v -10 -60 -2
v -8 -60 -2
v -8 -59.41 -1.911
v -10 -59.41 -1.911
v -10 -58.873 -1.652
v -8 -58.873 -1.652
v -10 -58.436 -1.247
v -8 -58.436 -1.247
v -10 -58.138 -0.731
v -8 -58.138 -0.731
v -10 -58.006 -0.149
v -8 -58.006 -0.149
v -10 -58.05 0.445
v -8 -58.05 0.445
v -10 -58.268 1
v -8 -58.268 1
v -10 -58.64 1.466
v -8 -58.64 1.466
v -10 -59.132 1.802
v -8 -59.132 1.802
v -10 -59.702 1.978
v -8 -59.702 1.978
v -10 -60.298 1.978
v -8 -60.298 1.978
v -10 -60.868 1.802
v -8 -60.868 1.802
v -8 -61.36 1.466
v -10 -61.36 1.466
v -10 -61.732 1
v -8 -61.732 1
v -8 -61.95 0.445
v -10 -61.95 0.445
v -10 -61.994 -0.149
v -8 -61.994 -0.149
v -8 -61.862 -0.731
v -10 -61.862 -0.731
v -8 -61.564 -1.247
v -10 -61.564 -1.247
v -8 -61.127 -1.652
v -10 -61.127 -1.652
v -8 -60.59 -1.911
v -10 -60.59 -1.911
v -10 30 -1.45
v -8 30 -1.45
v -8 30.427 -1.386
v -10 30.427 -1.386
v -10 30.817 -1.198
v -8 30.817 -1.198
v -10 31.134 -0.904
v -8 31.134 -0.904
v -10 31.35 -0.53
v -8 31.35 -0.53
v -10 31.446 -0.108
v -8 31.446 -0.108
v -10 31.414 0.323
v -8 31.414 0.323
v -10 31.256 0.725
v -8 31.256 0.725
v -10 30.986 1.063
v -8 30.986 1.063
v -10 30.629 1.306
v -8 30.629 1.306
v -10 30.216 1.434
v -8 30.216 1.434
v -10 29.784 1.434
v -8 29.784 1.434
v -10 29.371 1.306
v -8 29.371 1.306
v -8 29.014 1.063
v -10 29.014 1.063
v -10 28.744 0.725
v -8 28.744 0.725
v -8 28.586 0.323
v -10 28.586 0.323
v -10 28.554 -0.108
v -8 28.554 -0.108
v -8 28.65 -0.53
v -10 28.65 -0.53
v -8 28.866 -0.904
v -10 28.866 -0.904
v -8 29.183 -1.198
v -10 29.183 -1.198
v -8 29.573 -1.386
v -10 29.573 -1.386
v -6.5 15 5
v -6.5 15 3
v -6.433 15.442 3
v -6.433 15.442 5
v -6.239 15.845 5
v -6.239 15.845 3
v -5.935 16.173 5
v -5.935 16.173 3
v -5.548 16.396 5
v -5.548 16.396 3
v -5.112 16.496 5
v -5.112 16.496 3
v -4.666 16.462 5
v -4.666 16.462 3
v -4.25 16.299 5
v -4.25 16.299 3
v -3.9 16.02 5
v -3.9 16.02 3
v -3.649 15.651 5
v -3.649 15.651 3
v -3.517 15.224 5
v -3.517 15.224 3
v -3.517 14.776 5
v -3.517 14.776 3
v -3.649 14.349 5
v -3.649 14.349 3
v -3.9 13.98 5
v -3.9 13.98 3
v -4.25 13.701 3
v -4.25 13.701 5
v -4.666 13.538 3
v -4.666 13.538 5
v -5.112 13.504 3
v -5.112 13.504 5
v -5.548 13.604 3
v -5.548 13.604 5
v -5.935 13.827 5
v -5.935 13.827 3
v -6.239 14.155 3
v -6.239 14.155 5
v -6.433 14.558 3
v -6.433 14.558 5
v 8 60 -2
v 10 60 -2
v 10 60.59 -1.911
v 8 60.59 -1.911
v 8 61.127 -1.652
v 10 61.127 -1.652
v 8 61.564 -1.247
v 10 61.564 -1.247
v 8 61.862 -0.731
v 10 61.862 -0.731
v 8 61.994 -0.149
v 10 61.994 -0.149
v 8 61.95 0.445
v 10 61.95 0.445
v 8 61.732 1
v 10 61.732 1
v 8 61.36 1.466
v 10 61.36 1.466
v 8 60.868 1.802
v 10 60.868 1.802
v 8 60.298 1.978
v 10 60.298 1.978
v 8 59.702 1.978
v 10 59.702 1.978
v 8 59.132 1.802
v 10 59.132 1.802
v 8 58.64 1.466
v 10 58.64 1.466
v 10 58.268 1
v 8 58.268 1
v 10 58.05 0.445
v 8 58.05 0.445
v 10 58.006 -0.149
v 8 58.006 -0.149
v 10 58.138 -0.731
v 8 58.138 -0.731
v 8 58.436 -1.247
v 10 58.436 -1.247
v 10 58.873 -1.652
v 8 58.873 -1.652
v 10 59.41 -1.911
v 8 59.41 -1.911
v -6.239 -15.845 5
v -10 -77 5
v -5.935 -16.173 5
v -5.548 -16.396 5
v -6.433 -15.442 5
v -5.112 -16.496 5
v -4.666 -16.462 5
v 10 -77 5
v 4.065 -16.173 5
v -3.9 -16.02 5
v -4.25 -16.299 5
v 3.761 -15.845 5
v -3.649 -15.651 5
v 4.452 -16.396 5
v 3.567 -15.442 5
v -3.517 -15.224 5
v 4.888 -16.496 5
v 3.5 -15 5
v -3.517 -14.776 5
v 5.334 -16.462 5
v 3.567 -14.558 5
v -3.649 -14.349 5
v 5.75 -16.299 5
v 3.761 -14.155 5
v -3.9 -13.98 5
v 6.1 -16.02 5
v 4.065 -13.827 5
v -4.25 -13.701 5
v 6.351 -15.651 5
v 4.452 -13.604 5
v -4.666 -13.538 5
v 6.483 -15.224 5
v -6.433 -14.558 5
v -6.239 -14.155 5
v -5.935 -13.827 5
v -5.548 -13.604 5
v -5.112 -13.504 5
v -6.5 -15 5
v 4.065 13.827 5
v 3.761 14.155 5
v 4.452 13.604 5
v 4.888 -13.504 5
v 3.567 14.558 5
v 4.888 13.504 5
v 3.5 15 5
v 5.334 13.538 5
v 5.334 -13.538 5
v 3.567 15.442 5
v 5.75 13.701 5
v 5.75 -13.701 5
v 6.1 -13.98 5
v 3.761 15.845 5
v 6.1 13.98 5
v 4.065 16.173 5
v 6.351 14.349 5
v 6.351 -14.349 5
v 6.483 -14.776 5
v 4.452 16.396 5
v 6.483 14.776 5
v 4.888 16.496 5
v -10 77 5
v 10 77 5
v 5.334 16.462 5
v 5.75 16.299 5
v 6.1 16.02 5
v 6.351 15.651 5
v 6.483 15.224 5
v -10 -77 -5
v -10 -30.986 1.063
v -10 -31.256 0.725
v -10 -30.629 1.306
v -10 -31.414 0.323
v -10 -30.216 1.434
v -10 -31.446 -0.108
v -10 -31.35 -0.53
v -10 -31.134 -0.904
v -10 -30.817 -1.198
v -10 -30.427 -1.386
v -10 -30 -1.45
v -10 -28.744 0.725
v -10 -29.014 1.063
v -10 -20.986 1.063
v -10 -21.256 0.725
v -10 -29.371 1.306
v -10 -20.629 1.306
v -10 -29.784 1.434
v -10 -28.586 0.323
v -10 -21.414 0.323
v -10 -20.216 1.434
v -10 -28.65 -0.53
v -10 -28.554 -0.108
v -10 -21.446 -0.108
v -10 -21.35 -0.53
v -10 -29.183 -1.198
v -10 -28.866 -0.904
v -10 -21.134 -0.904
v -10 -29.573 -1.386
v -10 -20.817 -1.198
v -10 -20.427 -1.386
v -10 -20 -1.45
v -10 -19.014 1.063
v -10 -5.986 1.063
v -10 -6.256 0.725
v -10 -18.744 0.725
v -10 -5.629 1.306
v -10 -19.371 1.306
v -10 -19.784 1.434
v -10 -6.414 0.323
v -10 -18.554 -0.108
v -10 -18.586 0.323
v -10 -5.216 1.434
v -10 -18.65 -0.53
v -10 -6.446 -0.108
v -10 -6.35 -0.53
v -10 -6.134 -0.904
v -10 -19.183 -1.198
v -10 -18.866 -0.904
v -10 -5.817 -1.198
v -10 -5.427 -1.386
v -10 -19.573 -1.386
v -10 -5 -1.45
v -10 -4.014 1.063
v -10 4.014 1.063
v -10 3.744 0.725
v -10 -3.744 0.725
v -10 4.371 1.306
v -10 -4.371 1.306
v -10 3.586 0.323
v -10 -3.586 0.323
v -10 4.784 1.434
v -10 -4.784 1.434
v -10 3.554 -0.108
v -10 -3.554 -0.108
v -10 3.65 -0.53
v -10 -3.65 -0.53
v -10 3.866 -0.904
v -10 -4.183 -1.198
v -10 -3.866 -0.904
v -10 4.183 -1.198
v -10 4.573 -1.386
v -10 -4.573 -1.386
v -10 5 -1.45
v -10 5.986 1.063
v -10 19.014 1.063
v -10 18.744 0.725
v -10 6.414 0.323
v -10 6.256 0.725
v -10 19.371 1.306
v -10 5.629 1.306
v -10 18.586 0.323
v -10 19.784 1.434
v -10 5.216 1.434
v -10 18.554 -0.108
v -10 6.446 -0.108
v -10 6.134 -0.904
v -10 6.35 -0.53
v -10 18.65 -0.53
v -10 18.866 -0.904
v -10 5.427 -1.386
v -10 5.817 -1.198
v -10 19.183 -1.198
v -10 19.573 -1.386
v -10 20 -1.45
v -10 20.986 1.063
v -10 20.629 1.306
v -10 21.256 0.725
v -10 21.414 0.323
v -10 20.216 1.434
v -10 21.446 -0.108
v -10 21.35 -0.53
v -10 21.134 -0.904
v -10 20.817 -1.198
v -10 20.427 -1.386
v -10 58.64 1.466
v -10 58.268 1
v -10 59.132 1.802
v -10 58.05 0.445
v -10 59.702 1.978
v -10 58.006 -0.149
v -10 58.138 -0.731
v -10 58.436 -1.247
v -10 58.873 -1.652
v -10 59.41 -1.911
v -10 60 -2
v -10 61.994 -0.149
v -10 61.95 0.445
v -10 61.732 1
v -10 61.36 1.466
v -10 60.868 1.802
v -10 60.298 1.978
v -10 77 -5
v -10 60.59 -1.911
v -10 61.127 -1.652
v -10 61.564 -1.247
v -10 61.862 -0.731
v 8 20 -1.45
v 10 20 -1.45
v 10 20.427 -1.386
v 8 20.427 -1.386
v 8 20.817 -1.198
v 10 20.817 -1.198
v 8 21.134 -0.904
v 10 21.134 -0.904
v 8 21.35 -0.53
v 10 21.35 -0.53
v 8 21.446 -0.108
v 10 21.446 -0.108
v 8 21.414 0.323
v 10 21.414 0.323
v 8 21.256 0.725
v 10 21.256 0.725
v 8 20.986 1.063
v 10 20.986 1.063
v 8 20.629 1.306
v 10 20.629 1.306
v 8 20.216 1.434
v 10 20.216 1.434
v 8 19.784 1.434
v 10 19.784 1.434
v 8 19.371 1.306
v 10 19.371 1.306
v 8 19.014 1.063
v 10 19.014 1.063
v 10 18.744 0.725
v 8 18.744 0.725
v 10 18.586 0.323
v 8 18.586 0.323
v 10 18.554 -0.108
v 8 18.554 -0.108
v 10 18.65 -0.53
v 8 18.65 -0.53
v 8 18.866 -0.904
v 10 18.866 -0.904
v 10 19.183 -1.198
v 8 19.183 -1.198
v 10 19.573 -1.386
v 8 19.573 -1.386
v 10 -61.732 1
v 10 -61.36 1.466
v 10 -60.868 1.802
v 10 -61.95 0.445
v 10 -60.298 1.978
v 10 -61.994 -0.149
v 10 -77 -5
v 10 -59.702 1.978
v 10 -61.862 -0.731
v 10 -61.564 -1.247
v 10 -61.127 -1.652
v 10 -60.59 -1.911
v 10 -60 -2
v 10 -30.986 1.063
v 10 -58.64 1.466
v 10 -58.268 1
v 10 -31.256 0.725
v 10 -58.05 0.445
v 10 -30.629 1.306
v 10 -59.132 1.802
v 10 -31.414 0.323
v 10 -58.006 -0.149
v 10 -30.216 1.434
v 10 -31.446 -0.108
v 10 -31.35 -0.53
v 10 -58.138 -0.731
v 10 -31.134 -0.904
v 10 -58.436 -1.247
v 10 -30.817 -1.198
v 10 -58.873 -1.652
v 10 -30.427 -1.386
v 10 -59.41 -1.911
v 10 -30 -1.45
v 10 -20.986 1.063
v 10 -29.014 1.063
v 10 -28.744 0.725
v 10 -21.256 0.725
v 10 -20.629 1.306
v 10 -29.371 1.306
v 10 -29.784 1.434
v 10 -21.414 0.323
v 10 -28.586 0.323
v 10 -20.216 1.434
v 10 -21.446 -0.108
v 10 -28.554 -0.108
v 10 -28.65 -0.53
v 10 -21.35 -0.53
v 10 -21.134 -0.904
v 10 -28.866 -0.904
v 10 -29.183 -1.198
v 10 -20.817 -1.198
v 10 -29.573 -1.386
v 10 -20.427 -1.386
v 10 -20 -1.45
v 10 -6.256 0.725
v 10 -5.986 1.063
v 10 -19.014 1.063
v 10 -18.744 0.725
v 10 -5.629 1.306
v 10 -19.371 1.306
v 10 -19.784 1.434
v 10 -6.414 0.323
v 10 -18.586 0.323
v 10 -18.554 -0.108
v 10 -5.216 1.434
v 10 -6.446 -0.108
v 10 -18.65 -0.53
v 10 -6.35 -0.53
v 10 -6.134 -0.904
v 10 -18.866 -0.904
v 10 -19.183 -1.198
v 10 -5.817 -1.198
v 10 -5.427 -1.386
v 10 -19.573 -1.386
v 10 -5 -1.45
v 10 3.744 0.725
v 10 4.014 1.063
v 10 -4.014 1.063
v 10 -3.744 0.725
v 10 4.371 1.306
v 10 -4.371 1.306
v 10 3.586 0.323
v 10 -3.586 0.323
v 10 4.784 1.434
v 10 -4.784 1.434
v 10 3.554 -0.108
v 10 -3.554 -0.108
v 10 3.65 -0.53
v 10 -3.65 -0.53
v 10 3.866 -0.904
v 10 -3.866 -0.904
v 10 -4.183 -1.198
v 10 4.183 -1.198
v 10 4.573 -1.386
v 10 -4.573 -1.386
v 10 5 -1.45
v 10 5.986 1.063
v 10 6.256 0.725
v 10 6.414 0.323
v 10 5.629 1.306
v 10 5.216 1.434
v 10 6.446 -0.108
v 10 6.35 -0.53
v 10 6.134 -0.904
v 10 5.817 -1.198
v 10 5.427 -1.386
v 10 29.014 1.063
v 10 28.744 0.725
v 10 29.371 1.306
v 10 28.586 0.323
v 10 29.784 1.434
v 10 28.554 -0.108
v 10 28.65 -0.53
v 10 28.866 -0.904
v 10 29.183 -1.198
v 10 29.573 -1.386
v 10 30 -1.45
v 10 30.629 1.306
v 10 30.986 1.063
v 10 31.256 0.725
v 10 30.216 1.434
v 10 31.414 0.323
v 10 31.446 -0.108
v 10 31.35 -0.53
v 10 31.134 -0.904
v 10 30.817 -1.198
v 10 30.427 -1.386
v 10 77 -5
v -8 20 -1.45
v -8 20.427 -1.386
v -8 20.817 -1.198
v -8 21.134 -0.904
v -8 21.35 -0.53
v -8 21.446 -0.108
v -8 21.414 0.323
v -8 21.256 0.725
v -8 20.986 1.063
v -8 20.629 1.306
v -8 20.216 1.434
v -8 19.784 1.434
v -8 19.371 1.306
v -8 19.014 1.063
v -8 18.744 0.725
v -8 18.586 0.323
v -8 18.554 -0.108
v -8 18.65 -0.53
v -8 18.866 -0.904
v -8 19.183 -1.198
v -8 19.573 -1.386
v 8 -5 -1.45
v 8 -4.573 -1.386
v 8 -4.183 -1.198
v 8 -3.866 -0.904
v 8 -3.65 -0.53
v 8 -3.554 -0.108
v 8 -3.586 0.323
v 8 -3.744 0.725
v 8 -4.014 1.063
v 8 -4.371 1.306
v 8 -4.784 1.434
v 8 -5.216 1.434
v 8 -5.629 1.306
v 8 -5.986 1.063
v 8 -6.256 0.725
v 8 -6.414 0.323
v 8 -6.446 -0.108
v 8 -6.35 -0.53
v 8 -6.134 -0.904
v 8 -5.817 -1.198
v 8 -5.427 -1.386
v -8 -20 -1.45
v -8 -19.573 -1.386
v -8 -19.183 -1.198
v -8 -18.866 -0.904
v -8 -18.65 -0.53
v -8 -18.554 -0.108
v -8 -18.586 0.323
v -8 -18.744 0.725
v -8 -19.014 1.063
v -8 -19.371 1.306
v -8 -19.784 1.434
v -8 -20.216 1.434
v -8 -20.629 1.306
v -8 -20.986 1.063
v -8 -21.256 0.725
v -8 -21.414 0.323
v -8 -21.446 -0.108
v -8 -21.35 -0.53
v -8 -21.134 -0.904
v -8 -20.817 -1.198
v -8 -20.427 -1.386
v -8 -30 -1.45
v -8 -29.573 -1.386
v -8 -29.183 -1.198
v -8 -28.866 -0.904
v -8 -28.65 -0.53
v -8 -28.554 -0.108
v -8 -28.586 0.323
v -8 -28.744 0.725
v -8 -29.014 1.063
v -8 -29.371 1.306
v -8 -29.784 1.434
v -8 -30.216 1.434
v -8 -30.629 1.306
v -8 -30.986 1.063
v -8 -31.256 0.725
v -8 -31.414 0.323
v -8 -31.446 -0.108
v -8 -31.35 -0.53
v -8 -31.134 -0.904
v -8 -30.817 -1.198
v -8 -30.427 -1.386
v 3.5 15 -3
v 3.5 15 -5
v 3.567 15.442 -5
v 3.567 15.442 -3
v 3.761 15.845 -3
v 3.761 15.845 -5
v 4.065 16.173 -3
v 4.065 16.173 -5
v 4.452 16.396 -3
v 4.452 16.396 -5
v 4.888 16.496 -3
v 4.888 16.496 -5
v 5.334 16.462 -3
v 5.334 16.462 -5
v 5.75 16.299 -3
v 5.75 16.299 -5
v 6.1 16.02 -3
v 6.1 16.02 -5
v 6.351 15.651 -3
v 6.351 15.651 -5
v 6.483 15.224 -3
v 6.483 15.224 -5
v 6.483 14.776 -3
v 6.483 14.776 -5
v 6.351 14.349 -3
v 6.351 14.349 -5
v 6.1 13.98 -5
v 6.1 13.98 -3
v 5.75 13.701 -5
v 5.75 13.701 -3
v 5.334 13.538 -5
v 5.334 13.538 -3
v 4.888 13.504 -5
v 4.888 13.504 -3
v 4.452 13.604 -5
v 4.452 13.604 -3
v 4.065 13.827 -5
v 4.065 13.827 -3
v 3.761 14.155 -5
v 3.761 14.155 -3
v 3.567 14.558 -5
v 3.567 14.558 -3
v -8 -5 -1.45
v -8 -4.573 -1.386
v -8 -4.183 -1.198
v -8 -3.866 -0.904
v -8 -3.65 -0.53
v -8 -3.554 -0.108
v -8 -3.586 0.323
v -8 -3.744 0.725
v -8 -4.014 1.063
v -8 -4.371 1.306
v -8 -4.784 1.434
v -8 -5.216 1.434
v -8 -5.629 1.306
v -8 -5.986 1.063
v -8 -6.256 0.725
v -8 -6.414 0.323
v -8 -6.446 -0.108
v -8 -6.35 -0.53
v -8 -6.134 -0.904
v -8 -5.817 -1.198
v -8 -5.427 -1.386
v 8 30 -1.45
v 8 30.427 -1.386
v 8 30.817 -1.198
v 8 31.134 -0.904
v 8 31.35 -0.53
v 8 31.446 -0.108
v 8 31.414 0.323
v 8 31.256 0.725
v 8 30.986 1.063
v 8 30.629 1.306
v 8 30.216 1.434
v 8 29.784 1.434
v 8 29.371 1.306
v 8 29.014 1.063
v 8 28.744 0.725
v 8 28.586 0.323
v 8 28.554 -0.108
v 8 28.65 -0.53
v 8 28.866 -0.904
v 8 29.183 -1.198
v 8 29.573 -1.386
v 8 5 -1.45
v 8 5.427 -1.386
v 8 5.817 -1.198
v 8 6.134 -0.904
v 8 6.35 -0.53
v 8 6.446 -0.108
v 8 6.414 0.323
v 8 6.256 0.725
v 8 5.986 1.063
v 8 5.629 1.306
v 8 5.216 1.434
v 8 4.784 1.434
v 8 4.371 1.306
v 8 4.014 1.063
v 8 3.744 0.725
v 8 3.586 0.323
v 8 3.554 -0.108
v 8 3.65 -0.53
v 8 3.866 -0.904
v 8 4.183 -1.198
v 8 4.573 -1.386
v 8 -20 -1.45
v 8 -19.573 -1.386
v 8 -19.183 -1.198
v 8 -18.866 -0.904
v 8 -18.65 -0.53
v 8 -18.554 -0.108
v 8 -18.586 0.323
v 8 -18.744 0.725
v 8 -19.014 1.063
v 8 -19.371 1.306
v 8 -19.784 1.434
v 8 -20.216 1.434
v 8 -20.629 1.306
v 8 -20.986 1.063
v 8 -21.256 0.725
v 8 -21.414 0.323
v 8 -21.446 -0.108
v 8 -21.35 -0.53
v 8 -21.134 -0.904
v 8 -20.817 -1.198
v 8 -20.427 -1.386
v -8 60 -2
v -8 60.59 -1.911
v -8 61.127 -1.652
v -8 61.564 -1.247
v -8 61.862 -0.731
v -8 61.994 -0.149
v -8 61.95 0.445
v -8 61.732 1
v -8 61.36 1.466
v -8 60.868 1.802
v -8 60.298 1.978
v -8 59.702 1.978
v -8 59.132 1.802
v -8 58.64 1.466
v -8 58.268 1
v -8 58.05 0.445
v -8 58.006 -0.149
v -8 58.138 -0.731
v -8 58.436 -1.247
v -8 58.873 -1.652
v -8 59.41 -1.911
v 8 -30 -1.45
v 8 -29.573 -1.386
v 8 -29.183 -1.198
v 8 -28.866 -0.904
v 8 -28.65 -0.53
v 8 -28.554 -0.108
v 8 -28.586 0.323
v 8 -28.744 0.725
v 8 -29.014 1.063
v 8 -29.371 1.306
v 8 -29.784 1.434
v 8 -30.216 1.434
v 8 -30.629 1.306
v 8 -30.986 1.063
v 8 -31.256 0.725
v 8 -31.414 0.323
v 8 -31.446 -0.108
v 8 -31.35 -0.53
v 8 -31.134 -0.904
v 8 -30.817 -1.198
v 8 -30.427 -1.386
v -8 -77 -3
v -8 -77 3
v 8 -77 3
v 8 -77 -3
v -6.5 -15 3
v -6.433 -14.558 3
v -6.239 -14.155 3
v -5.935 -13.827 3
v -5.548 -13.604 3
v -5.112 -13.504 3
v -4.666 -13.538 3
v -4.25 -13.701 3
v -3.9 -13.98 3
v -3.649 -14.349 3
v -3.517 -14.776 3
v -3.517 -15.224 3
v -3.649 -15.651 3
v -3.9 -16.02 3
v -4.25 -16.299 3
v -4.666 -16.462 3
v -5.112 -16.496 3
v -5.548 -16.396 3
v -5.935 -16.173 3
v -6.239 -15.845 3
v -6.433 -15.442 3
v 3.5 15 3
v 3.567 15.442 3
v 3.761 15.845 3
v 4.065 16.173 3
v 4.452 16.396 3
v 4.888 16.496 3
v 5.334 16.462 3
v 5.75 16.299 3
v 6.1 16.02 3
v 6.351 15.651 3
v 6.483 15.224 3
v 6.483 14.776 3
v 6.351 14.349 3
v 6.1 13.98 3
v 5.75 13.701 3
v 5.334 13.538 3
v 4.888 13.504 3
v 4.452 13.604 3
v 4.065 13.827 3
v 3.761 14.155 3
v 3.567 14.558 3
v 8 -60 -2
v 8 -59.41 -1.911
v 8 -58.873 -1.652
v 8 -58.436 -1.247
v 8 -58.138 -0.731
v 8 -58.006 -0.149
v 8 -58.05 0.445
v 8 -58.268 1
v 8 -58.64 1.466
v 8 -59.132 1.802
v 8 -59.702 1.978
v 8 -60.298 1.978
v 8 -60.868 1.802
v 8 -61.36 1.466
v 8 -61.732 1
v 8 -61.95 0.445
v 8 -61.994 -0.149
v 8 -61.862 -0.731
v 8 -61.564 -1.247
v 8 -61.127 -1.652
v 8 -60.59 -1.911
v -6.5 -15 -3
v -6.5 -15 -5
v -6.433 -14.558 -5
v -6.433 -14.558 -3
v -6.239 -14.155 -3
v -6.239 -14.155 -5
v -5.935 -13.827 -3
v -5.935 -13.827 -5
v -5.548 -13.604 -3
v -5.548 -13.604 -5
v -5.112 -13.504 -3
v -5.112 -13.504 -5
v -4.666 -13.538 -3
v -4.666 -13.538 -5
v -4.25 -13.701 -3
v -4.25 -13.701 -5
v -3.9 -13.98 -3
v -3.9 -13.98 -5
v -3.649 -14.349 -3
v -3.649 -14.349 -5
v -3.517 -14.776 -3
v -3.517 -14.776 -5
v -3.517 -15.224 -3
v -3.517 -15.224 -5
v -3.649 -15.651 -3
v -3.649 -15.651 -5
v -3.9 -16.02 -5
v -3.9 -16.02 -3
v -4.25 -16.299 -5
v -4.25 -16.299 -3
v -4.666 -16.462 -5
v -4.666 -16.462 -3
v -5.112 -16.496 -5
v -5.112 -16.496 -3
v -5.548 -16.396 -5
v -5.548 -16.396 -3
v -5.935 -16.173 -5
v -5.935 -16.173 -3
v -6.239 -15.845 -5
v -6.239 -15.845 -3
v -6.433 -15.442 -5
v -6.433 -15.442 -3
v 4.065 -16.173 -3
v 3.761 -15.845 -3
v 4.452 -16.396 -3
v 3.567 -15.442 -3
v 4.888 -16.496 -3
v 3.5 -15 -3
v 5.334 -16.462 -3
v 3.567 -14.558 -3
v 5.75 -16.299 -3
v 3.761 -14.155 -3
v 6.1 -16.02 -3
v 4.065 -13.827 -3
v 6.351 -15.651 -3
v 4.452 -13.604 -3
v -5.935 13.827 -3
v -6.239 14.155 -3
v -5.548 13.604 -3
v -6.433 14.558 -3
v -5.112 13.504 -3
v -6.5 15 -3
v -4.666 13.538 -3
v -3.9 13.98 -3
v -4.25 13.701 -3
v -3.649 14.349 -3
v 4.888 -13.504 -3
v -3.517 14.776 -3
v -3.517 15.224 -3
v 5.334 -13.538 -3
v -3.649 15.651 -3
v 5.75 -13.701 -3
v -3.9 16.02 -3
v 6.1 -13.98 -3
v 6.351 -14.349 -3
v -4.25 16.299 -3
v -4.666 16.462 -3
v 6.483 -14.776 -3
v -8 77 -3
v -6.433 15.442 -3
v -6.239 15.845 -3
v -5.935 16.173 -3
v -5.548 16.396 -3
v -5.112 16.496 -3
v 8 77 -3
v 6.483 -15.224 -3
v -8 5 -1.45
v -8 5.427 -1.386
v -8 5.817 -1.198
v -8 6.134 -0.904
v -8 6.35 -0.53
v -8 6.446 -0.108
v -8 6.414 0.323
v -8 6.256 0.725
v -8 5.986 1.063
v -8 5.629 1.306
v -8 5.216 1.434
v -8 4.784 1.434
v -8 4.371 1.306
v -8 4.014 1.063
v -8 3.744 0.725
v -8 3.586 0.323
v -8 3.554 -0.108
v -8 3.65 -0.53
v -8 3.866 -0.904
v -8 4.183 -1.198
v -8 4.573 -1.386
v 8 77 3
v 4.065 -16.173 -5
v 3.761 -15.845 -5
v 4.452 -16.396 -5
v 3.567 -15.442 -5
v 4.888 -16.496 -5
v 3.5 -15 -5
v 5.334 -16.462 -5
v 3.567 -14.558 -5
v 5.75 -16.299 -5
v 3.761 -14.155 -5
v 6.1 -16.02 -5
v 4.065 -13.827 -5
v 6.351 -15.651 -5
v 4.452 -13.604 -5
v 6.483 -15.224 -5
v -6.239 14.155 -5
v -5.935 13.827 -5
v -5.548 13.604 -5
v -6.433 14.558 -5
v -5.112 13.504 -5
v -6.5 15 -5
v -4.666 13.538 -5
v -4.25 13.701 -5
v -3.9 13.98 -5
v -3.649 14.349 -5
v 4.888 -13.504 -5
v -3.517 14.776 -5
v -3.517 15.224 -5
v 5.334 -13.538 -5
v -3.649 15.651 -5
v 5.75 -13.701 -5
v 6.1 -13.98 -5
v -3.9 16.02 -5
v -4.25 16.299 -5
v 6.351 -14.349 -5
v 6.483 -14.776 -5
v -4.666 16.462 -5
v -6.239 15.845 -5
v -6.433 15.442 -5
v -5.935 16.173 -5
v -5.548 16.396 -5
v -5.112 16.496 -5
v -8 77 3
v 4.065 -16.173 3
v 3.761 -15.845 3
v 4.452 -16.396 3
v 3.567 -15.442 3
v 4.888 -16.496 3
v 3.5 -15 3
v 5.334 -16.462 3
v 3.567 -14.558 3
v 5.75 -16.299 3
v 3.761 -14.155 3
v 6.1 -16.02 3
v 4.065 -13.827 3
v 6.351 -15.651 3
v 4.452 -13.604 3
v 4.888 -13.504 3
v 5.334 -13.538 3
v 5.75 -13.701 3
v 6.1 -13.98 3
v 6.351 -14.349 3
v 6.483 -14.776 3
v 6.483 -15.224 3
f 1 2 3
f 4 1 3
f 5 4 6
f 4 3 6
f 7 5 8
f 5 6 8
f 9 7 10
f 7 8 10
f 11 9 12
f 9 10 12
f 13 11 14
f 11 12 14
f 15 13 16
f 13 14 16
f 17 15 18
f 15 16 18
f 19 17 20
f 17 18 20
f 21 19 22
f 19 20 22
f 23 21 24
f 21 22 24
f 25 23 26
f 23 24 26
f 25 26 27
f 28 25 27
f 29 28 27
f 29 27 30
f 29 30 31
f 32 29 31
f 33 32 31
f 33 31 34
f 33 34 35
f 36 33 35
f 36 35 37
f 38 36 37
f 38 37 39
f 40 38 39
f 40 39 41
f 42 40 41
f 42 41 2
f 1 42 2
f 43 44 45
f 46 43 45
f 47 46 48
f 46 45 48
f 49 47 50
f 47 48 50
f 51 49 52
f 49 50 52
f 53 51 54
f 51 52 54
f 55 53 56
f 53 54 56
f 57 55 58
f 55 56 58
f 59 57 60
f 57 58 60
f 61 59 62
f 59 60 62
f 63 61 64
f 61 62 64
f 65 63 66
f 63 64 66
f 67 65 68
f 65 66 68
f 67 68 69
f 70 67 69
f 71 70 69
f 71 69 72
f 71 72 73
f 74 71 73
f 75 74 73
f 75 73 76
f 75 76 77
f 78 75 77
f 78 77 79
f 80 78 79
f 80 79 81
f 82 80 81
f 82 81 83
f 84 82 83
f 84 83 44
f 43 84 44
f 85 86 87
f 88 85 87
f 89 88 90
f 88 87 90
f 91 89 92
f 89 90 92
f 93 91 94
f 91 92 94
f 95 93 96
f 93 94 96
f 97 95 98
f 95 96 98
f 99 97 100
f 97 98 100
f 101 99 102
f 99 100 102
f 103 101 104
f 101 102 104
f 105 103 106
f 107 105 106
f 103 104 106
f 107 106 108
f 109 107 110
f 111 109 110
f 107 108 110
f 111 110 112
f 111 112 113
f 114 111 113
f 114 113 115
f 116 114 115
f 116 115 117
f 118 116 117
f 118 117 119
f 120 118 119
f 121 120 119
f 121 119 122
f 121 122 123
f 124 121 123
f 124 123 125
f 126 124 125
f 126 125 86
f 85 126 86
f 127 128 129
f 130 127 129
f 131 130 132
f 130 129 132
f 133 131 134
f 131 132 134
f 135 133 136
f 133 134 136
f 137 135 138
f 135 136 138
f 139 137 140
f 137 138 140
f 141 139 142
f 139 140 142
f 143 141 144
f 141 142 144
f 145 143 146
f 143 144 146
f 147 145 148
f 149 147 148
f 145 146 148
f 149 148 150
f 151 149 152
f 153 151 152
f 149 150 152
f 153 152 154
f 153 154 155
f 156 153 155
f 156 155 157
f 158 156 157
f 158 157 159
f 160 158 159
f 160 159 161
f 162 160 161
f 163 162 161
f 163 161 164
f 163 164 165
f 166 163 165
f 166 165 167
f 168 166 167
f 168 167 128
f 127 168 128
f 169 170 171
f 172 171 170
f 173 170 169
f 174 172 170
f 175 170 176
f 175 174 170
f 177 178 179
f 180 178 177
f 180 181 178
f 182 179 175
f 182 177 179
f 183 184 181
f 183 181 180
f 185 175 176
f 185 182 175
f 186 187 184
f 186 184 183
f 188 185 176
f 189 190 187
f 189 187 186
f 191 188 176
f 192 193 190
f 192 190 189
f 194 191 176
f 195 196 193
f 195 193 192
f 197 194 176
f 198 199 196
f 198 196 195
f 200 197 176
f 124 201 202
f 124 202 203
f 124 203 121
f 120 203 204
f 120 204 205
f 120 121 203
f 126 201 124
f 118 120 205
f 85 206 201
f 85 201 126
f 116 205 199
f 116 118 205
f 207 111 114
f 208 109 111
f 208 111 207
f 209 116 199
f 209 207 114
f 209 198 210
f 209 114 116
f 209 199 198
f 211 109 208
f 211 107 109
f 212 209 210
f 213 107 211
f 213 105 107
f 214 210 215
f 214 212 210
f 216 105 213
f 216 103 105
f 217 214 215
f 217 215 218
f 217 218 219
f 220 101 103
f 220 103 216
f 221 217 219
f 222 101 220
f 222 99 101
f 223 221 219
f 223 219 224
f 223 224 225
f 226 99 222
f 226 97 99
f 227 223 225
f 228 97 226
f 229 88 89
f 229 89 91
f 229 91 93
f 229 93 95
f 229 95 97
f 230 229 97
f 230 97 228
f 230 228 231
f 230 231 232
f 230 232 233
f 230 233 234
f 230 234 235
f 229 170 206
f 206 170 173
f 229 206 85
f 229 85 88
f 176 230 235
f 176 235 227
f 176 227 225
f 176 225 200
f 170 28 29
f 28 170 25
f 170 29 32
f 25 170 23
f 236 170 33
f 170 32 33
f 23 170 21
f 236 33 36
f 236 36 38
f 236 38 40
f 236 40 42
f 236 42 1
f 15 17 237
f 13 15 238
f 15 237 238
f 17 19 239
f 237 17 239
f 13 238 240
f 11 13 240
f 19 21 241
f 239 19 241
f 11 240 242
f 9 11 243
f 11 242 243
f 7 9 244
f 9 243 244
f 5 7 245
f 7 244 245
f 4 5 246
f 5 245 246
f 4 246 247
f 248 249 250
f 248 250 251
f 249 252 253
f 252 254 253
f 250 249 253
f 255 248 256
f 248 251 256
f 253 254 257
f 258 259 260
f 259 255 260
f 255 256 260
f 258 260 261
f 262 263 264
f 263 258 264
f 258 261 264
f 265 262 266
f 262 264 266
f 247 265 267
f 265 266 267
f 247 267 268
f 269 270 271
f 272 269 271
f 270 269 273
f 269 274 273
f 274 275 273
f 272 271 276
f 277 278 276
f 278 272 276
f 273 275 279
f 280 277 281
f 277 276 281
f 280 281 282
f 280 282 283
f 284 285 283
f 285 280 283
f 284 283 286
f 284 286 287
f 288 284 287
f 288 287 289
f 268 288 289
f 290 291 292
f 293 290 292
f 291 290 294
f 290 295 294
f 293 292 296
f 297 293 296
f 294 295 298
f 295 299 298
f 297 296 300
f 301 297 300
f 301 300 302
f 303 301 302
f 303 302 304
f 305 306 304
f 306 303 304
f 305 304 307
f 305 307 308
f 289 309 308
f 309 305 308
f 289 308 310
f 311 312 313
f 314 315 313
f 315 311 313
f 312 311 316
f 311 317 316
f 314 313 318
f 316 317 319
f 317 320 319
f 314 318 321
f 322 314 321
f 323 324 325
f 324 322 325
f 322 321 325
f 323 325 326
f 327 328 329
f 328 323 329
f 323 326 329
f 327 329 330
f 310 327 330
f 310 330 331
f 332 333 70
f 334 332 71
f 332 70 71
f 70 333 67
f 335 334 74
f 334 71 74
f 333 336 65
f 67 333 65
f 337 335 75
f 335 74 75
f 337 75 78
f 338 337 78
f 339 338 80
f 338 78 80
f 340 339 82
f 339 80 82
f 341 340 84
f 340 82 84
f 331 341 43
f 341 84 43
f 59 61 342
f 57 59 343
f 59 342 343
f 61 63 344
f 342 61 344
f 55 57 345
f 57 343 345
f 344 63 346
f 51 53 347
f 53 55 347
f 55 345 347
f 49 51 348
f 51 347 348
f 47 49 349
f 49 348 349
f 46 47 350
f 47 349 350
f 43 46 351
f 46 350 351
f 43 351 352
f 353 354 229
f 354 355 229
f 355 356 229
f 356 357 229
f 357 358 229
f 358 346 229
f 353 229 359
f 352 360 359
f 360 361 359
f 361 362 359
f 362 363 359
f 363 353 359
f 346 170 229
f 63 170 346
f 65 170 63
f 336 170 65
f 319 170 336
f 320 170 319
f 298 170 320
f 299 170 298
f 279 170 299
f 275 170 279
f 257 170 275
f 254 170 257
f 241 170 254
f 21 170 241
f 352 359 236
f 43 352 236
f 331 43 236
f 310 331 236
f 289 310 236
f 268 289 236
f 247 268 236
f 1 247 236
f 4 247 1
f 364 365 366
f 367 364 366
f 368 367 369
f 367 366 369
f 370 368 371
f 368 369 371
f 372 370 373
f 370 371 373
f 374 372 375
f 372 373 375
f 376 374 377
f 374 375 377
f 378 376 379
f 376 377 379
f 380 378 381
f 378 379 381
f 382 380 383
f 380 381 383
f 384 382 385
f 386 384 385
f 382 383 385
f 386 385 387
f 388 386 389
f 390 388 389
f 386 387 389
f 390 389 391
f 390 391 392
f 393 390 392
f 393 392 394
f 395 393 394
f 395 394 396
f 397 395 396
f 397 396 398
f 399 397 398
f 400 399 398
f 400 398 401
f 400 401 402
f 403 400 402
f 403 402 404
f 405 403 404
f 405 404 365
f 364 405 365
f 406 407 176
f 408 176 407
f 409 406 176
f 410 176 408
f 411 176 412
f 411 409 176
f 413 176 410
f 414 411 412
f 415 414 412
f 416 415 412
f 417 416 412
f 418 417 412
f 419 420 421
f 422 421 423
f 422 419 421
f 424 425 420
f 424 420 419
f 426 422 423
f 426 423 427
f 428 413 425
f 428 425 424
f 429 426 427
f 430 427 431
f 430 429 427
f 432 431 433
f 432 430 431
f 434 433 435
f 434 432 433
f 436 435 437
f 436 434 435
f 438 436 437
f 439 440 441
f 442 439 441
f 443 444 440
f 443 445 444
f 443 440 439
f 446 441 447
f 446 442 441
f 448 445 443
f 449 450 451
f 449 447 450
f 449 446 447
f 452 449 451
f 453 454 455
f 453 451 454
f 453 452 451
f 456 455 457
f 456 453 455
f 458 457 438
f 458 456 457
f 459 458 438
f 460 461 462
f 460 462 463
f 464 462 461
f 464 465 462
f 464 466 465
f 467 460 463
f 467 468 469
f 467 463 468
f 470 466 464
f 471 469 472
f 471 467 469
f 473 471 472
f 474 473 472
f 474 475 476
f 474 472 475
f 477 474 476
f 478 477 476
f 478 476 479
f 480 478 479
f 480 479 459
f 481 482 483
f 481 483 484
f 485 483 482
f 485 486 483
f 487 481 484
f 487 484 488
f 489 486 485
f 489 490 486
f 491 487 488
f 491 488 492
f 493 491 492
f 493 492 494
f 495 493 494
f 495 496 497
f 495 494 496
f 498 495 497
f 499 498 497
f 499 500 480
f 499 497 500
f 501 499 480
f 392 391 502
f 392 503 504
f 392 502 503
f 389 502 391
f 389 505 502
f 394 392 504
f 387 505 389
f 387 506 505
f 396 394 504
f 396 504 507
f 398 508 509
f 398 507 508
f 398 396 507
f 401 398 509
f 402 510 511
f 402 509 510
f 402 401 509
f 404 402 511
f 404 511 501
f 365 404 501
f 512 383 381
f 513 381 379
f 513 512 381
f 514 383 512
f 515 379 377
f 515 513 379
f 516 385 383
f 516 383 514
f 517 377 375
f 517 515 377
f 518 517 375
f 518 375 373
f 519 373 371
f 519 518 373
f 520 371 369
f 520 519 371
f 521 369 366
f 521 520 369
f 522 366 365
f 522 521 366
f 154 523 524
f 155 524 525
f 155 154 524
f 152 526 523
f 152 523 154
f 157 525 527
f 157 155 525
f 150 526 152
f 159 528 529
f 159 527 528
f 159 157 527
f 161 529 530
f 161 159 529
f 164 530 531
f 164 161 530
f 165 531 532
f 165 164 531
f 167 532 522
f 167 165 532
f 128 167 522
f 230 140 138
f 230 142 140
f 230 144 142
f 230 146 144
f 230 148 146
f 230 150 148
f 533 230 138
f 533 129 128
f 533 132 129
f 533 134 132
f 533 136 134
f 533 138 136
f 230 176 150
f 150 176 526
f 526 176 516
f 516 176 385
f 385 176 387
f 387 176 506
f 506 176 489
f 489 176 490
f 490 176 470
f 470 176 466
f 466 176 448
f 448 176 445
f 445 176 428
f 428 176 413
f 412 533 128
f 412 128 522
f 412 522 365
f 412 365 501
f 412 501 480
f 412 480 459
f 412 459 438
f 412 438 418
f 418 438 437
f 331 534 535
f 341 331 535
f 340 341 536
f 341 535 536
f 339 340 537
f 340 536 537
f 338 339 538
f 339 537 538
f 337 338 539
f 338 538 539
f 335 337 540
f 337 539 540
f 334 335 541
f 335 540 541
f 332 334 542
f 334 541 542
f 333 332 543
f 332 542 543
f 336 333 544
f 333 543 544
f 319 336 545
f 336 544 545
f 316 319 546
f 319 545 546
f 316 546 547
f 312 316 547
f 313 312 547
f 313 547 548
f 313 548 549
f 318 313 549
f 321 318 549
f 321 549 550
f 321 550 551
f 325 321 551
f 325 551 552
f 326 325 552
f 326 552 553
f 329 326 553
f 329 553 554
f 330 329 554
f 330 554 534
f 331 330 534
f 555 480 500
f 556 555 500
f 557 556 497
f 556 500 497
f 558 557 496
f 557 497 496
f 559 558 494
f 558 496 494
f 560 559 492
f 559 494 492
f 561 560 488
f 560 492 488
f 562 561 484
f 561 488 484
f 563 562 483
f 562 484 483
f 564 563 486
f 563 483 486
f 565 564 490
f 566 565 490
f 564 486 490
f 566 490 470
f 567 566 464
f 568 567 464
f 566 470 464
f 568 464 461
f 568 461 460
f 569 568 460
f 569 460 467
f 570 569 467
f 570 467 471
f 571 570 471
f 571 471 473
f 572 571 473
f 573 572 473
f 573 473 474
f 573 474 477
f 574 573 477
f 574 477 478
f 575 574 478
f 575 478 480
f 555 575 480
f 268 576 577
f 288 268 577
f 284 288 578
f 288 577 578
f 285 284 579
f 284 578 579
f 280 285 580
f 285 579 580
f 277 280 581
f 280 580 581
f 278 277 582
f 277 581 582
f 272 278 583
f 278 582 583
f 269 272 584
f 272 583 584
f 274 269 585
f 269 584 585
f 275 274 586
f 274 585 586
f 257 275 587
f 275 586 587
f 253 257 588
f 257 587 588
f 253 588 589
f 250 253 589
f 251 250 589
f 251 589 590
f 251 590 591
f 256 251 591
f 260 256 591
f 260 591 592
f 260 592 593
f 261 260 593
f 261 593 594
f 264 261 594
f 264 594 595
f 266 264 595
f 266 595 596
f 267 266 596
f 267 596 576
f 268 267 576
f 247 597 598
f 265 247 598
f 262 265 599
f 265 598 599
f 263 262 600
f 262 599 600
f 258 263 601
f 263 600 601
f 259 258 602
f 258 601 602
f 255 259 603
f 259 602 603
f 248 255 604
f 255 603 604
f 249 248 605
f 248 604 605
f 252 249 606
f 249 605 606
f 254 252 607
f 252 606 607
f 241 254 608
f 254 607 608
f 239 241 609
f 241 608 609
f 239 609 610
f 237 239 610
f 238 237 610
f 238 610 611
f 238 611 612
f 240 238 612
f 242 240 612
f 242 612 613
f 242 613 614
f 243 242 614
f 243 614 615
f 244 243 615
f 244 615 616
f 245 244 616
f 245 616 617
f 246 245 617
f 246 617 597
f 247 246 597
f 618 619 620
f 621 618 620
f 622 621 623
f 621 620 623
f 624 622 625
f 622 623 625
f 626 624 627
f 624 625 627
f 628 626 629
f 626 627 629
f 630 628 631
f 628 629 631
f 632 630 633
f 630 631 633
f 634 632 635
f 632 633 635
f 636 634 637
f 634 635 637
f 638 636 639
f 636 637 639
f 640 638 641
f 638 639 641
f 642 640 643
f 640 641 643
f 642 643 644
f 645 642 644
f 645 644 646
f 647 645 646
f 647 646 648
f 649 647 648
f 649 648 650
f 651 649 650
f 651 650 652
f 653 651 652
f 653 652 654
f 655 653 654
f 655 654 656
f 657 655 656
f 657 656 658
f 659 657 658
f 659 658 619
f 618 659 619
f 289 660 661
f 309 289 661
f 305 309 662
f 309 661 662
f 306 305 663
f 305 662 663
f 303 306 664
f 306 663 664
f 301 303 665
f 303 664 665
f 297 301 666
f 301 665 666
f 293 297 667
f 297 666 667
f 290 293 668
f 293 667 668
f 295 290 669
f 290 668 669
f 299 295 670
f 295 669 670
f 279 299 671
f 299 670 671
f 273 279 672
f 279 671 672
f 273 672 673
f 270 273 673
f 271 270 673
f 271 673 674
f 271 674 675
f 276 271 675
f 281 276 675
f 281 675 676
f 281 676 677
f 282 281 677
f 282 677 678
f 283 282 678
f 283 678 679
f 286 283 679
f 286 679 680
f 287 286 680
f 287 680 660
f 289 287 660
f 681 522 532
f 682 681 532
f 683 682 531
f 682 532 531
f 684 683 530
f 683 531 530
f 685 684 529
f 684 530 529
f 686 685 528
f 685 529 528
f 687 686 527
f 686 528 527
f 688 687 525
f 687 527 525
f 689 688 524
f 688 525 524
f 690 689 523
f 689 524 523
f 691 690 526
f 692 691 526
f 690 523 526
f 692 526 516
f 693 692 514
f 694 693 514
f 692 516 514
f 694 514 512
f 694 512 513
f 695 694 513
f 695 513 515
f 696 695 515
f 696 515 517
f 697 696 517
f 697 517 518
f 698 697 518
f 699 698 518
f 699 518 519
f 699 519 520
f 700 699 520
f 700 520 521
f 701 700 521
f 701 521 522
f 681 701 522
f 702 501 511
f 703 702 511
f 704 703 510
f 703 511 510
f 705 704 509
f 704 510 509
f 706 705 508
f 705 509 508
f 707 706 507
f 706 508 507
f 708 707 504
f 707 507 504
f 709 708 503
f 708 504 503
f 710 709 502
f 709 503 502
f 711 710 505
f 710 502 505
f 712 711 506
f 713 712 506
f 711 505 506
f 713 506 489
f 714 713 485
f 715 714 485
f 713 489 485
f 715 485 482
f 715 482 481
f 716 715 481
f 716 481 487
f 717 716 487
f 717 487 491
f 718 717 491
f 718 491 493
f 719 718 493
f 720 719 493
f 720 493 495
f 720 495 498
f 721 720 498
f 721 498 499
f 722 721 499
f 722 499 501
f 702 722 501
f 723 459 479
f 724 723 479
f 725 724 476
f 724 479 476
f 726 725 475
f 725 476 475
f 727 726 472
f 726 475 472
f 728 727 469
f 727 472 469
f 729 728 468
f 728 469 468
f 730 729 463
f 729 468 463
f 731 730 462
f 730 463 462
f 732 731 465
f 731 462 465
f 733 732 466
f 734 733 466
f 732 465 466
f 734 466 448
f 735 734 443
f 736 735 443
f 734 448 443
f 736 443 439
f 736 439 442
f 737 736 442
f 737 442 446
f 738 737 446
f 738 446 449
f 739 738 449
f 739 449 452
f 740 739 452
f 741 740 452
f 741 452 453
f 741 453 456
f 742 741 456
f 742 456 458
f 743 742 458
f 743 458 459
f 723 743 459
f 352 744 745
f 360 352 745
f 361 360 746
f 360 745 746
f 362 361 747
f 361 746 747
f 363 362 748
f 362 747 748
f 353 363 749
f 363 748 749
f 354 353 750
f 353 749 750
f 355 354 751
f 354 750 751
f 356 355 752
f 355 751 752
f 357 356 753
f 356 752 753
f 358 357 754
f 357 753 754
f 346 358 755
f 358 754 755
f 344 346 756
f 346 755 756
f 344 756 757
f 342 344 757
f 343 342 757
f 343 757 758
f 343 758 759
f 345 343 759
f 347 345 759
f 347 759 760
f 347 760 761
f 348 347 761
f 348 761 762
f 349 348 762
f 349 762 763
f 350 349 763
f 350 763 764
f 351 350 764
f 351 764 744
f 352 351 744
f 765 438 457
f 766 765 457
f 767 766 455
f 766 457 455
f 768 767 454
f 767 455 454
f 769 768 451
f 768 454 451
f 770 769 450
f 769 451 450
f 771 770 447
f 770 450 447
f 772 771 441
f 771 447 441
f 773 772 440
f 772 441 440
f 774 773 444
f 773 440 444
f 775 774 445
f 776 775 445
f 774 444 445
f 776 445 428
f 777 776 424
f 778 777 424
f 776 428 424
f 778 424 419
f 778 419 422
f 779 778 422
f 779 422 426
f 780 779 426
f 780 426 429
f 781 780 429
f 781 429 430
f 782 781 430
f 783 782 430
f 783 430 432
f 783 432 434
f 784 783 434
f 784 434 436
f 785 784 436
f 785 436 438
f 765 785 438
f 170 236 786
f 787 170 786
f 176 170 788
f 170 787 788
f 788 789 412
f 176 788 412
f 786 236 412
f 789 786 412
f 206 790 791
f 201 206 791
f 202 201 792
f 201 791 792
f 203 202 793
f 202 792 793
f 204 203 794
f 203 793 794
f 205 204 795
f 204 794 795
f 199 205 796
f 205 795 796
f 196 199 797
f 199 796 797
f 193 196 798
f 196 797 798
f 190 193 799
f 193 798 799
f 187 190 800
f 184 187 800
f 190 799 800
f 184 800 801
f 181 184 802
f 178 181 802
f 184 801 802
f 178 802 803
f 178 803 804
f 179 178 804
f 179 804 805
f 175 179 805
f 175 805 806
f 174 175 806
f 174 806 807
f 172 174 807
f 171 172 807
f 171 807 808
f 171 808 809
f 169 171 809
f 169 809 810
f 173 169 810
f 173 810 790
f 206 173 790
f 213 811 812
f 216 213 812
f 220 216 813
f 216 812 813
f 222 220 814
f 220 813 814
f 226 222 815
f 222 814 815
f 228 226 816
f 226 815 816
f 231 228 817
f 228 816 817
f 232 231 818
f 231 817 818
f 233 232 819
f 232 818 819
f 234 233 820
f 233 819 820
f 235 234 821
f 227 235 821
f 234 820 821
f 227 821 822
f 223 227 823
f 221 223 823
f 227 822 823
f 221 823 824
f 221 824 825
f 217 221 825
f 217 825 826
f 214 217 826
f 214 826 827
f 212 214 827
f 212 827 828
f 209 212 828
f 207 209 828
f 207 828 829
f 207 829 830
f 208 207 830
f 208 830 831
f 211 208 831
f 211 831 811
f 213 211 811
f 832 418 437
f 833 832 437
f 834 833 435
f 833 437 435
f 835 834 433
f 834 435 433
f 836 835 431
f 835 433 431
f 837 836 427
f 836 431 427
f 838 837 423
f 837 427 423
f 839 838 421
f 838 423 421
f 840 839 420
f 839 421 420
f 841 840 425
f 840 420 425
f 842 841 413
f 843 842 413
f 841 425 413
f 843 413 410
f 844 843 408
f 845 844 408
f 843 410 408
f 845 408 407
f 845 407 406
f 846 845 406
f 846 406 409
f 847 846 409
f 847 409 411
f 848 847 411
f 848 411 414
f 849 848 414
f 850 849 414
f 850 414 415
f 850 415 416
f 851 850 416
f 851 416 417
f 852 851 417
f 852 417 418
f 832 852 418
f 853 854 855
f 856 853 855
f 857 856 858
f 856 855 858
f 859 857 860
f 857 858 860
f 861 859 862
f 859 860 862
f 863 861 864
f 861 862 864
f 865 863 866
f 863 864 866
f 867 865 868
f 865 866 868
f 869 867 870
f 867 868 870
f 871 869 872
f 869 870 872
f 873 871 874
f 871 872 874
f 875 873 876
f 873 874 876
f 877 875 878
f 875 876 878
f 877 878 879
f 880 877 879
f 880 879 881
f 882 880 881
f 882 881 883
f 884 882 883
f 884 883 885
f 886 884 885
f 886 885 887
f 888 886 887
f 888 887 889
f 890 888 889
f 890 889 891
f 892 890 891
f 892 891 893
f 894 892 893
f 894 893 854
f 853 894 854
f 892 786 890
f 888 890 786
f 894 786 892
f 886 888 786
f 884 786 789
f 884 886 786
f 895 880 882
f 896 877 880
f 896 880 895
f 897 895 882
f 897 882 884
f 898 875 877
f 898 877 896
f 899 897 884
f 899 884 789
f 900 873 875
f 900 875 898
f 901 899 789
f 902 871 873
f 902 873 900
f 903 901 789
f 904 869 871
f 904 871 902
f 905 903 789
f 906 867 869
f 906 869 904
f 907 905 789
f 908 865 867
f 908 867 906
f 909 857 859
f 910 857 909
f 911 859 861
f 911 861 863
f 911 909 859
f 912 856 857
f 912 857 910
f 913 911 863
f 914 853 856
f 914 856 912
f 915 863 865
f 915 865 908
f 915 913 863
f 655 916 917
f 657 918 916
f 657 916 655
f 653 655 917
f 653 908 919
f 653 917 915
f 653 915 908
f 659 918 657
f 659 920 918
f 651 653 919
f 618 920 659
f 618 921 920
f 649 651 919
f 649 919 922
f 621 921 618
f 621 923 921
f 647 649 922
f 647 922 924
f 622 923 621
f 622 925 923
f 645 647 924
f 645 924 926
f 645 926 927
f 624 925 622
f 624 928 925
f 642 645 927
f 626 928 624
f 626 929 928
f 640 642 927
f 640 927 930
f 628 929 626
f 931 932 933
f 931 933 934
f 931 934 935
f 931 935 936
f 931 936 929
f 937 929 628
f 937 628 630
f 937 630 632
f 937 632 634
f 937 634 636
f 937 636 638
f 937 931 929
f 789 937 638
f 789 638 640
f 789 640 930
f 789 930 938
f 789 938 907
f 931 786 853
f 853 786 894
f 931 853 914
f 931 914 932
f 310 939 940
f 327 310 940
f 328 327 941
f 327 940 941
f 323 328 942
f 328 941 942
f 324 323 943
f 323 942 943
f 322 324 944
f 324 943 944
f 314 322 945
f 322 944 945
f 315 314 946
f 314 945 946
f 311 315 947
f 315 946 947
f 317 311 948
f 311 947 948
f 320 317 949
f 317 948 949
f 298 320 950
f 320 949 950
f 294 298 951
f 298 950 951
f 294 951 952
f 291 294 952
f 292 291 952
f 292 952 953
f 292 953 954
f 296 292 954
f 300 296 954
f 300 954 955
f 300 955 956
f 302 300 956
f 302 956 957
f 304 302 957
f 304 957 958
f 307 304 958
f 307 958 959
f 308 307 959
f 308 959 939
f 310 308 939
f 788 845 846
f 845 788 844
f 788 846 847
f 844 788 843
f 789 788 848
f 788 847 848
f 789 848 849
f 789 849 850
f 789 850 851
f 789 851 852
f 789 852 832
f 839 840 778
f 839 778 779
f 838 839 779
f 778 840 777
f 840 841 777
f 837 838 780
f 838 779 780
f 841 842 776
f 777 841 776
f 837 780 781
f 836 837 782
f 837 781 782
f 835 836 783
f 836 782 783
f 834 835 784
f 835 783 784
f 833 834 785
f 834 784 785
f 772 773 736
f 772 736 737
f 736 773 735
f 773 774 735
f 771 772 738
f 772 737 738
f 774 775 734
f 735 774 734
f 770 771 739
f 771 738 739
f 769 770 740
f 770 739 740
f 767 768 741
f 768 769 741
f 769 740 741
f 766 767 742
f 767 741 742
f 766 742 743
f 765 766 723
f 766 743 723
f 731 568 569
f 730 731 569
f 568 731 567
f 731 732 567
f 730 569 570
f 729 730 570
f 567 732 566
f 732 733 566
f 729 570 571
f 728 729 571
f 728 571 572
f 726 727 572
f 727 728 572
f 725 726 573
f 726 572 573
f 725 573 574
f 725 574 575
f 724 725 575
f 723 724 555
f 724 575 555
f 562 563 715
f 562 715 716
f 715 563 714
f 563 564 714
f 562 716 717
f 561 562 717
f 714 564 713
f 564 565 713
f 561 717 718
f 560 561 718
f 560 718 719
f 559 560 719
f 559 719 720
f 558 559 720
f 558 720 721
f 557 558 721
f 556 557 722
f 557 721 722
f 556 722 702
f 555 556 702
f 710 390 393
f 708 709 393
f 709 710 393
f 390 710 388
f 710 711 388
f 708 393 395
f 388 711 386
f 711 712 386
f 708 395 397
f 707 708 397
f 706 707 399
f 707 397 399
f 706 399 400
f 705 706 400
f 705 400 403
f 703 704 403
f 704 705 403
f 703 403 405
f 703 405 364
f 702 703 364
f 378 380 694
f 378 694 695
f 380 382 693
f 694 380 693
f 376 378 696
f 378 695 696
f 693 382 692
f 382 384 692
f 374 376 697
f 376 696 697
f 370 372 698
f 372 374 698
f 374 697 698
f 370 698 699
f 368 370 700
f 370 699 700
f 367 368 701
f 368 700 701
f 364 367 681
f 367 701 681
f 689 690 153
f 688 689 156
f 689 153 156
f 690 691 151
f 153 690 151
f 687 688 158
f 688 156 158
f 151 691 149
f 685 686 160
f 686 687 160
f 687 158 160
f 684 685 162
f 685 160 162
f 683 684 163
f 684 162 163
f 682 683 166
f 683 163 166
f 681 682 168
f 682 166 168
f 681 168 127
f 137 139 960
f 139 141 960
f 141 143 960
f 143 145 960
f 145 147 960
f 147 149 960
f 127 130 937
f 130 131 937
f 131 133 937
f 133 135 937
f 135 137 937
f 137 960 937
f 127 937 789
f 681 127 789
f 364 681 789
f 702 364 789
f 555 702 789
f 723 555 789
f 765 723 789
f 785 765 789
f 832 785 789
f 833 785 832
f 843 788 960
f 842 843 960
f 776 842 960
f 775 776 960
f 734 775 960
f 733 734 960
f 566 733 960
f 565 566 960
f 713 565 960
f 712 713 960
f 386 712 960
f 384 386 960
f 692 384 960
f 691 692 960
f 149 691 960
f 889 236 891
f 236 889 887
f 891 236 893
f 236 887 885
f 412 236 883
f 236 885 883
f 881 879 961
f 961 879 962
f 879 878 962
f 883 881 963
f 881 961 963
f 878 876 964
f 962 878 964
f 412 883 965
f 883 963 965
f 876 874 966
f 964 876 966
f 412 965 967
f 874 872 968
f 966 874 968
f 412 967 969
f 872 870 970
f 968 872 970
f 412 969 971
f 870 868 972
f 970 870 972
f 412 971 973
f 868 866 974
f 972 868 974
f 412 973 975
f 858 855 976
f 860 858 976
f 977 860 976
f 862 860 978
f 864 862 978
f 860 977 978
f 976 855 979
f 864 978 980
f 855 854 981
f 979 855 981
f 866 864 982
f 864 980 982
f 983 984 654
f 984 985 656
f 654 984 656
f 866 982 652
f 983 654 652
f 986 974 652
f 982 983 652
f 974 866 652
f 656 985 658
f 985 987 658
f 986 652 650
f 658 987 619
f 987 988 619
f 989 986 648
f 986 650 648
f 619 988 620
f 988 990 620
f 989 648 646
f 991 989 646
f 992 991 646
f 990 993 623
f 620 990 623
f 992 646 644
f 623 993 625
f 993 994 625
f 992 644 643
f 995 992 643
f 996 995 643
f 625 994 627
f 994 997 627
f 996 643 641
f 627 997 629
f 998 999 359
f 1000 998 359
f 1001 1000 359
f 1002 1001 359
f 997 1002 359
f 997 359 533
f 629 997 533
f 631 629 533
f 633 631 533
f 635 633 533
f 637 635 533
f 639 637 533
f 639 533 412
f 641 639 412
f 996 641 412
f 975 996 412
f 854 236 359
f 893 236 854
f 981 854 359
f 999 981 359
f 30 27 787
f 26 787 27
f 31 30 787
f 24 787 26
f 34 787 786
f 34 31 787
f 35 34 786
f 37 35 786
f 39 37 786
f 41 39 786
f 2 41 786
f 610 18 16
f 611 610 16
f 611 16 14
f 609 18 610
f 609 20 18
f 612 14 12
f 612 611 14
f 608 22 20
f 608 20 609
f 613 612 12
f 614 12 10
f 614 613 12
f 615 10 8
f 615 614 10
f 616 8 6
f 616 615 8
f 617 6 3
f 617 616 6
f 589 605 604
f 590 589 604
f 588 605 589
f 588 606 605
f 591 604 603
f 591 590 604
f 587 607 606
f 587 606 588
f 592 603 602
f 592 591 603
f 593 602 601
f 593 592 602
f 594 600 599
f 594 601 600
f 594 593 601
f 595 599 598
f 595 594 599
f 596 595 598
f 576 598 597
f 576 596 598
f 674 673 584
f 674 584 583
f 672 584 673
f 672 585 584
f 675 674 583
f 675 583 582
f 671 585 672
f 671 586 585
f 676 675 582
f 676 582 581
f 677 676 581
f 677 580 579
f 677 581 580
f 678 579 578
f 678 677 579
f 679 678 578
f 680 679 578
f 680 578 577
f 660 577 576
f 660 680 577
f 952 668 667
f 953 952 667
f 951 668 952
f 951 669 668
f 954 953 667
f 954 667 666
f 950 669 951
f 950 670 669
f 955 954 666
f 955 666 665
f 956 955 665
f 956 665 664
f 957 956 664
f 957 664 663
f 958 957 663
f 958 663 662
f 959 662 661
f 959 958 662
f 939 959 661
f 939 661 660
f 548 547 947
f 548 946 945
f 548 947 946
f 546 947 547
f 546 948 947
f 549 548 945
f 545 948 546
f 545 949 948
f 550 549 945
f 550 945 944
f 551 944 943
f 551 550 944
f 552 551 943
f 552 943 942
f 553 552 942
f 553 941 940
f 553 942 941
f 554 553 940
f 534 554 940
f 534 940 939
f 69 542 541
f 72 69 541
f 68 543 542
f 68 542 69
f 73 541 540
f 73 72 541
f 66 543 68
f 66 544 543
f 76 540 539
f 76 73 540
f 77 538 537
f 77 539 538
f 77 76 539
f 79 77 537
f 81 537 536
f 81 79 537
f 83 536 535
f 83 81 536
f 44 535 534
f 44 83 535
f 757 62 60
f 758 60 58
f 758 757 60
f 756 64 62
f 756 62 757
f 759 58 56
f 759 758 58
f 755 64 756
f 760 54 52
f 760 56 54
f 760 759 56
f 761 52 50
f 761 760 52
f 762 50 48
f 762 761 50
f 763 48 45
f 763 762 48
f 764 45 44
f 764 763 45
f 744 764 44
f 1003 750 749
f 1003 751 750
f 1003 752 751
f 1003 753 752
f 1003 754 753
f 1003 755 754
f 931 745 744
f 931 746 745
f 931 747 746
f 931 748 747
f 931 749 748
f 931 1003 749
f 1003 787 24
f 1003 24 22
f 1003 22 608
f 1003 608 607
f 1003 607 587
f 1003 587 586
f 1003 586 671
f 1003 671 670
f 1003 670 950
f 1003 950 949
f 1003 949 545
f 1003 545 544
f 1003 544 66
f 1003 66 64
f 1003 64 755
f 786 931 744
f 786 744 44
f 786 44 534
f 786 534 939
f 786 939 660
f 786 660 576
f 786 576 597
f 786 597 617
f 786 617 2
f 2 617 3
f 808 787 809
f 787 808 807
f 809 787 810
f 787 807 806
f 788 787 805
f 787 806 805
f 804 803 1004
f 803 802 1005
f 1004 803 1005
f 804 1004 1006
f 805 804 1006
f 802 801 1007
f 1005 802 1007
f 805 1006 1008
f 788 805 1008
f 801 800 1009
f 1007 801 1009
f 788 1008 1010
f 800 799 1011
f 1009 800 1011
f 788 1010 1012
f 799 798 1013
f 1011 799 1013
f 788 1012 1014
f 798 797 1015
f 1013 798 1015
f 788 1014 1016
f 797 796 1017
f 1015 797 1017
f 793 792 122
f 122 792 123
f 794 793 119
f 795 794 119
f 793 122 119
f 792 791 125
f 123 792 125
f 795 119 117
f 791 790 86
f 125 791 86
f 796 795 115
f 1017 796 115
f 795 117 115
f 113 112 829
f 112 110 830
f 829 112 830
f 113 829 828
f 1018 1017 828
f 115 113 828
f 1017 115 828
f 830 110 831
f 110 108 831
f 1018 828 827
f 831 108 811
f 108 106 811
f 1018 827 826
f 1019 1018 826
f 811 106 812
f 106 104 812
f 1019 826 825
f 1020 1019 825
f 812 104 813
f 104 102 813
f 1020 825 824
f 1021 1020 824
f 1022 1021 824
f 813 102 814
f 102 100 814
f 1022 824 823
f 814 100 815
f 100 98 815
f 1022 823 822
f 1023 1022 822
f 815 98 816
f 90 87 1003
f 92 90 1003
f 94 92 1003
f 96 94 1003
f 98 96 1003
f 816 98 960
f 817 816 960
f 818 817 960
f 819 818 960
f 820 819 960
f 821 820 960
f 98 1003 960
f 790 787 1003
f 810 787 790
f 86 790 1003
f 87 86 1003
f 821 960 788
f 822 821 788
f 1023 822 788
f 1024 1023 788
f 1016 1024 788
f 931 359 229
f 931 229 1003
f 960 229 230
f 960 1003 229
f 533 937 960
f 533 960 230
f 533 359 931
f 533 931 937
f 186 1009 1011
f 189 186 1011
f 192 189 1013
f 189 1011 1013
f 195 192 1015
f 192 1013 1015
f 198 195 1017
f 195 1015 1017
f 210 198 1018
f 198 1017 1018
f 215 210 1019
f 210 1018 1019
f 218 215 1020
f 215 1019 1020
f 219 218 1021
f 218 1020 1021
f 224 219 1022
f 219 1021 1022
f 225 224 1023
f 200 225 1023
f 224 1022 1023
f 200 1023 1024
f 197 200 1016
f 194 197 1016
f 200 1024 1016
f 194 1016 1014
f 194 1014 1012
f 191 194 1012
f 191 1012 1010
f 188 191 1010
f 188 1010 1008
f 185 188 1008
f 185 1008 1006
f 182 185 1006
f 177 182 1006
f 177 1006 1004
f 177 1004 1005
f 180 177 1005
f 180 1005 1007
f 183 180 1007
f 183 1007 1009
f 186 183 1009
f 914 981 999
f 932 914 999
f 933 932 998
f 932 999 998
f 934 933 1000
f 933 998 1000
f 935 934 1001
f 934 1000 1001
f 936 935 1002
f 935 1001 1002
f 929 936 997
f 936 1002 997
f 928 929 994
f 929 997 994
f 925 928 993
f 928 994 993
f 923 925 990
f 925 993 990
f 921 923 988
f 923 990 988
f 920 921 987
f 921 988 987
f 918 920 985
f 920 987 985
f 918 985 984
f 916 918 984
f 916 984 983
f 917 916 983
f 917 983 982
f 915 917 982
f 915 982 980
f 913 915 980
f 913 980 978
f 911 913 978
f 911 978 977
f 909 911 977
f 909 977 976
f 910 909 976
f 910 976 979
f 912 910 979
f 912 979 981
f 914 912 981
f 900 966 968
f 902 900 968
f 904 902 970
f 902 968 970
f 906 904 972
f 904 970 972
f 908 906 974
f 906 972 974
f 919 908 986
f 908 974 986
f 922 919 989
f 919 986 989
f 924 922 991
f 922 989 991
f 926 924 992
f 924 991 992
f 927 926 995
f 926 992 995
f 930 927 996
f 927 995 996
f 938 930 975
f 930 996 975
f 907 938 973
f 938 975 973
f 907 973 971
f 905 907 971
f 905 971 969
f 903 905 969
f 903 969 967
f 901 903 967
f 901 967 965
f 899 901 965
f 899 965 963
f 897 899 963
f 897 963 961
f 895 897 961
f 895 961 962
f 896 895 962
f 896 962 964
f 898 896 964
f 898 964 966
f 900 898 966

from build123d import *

# Parameters (mm, degrees)
SKETCH_1_W          = 20
SKETCH_1_H          = 10
SKETCH_1_W_2        = 16
SKETCH_1_H_2        = 6
EXTRUDE_1_DEPTH     = 77
SKETCH_2_R          = 1.45
SKETCH_2_R_2        = 2
CUT_EXTRUDE_1_DEPTH = 80.711981534
SKETCH_3_R          = 1.5
CUT_EXTRUDE_2_DEPTH = 79.287930104


with BuildPart() as part:
    # 草图1 → 凸台-拉伸1 (new, symmetric)
    with BuildSketch(Plane(origin=(0, 0, 0), x_dir=(1, 0, 0), z_dir=(0, 1, 0))):
        Rectangle(SKETCH_1_W, SKETCH_1_H)
        Rectangle(SKETCH_1_W_2, SKETCH_1_H_2, mode=Mode.SUBTRACT)
    extrude(amount=EXTRUDE_1_DEPTH, both=True)

    # 草图2 → 切除-拉伸1 (cut, through all)
    with BuildSketch(Plane(origin=(10, 0, 0), x_dir=(0, 0, -1), z_dir=(1, 0, 0))):
        with Locations((0, 5)):
            Circle(SKETCH_2_R)
        with Locations((0, 20)):
            Circle(SKETCH_2_R)
        with Locations((0, 30)):
            Circle(SKETCH_2_R)
        with Locations((0, -30)):
            Circle(SKETCH_2_R)
        with Locations((0, -20)):
            Circle(SKETCH_2_R)
        with Locations((0, -5)):
            Circle(SKETCH_2_R)
        with Locations((0, 60)):
            Circle(SKETCH_2_R_2)
        with Locations((0, -60)):
            Circle(SKETCH_2_R_2)
    extrude(amount=-CUT_EXTRUDE_1_DEPTH, mode=Mode.SUBTRACT)

    # 草图3 → 切除-拉伸2 (cut, through all)
    with BuildSketch(Plane(origin=(0, 0, -5), x_dir=(-1, 0, 0), z_dir=(0, 0, -1))):
        with Locations((5, -15)):
            Circle(SKETCH_3_R)
        with Locations((-5, -15)):
            Circle(SKETCH_3_R)
        with Locations((5, 15)):
            Circle(SKETCH_3_R)
        with Locations((-5, 15)):
            Circle(SKETCH_3_R)
    extrude(amount=-CUT_EXTRUDE_2_DEPTH, mode=Mode.SUBTRACT)


solid = part.part
